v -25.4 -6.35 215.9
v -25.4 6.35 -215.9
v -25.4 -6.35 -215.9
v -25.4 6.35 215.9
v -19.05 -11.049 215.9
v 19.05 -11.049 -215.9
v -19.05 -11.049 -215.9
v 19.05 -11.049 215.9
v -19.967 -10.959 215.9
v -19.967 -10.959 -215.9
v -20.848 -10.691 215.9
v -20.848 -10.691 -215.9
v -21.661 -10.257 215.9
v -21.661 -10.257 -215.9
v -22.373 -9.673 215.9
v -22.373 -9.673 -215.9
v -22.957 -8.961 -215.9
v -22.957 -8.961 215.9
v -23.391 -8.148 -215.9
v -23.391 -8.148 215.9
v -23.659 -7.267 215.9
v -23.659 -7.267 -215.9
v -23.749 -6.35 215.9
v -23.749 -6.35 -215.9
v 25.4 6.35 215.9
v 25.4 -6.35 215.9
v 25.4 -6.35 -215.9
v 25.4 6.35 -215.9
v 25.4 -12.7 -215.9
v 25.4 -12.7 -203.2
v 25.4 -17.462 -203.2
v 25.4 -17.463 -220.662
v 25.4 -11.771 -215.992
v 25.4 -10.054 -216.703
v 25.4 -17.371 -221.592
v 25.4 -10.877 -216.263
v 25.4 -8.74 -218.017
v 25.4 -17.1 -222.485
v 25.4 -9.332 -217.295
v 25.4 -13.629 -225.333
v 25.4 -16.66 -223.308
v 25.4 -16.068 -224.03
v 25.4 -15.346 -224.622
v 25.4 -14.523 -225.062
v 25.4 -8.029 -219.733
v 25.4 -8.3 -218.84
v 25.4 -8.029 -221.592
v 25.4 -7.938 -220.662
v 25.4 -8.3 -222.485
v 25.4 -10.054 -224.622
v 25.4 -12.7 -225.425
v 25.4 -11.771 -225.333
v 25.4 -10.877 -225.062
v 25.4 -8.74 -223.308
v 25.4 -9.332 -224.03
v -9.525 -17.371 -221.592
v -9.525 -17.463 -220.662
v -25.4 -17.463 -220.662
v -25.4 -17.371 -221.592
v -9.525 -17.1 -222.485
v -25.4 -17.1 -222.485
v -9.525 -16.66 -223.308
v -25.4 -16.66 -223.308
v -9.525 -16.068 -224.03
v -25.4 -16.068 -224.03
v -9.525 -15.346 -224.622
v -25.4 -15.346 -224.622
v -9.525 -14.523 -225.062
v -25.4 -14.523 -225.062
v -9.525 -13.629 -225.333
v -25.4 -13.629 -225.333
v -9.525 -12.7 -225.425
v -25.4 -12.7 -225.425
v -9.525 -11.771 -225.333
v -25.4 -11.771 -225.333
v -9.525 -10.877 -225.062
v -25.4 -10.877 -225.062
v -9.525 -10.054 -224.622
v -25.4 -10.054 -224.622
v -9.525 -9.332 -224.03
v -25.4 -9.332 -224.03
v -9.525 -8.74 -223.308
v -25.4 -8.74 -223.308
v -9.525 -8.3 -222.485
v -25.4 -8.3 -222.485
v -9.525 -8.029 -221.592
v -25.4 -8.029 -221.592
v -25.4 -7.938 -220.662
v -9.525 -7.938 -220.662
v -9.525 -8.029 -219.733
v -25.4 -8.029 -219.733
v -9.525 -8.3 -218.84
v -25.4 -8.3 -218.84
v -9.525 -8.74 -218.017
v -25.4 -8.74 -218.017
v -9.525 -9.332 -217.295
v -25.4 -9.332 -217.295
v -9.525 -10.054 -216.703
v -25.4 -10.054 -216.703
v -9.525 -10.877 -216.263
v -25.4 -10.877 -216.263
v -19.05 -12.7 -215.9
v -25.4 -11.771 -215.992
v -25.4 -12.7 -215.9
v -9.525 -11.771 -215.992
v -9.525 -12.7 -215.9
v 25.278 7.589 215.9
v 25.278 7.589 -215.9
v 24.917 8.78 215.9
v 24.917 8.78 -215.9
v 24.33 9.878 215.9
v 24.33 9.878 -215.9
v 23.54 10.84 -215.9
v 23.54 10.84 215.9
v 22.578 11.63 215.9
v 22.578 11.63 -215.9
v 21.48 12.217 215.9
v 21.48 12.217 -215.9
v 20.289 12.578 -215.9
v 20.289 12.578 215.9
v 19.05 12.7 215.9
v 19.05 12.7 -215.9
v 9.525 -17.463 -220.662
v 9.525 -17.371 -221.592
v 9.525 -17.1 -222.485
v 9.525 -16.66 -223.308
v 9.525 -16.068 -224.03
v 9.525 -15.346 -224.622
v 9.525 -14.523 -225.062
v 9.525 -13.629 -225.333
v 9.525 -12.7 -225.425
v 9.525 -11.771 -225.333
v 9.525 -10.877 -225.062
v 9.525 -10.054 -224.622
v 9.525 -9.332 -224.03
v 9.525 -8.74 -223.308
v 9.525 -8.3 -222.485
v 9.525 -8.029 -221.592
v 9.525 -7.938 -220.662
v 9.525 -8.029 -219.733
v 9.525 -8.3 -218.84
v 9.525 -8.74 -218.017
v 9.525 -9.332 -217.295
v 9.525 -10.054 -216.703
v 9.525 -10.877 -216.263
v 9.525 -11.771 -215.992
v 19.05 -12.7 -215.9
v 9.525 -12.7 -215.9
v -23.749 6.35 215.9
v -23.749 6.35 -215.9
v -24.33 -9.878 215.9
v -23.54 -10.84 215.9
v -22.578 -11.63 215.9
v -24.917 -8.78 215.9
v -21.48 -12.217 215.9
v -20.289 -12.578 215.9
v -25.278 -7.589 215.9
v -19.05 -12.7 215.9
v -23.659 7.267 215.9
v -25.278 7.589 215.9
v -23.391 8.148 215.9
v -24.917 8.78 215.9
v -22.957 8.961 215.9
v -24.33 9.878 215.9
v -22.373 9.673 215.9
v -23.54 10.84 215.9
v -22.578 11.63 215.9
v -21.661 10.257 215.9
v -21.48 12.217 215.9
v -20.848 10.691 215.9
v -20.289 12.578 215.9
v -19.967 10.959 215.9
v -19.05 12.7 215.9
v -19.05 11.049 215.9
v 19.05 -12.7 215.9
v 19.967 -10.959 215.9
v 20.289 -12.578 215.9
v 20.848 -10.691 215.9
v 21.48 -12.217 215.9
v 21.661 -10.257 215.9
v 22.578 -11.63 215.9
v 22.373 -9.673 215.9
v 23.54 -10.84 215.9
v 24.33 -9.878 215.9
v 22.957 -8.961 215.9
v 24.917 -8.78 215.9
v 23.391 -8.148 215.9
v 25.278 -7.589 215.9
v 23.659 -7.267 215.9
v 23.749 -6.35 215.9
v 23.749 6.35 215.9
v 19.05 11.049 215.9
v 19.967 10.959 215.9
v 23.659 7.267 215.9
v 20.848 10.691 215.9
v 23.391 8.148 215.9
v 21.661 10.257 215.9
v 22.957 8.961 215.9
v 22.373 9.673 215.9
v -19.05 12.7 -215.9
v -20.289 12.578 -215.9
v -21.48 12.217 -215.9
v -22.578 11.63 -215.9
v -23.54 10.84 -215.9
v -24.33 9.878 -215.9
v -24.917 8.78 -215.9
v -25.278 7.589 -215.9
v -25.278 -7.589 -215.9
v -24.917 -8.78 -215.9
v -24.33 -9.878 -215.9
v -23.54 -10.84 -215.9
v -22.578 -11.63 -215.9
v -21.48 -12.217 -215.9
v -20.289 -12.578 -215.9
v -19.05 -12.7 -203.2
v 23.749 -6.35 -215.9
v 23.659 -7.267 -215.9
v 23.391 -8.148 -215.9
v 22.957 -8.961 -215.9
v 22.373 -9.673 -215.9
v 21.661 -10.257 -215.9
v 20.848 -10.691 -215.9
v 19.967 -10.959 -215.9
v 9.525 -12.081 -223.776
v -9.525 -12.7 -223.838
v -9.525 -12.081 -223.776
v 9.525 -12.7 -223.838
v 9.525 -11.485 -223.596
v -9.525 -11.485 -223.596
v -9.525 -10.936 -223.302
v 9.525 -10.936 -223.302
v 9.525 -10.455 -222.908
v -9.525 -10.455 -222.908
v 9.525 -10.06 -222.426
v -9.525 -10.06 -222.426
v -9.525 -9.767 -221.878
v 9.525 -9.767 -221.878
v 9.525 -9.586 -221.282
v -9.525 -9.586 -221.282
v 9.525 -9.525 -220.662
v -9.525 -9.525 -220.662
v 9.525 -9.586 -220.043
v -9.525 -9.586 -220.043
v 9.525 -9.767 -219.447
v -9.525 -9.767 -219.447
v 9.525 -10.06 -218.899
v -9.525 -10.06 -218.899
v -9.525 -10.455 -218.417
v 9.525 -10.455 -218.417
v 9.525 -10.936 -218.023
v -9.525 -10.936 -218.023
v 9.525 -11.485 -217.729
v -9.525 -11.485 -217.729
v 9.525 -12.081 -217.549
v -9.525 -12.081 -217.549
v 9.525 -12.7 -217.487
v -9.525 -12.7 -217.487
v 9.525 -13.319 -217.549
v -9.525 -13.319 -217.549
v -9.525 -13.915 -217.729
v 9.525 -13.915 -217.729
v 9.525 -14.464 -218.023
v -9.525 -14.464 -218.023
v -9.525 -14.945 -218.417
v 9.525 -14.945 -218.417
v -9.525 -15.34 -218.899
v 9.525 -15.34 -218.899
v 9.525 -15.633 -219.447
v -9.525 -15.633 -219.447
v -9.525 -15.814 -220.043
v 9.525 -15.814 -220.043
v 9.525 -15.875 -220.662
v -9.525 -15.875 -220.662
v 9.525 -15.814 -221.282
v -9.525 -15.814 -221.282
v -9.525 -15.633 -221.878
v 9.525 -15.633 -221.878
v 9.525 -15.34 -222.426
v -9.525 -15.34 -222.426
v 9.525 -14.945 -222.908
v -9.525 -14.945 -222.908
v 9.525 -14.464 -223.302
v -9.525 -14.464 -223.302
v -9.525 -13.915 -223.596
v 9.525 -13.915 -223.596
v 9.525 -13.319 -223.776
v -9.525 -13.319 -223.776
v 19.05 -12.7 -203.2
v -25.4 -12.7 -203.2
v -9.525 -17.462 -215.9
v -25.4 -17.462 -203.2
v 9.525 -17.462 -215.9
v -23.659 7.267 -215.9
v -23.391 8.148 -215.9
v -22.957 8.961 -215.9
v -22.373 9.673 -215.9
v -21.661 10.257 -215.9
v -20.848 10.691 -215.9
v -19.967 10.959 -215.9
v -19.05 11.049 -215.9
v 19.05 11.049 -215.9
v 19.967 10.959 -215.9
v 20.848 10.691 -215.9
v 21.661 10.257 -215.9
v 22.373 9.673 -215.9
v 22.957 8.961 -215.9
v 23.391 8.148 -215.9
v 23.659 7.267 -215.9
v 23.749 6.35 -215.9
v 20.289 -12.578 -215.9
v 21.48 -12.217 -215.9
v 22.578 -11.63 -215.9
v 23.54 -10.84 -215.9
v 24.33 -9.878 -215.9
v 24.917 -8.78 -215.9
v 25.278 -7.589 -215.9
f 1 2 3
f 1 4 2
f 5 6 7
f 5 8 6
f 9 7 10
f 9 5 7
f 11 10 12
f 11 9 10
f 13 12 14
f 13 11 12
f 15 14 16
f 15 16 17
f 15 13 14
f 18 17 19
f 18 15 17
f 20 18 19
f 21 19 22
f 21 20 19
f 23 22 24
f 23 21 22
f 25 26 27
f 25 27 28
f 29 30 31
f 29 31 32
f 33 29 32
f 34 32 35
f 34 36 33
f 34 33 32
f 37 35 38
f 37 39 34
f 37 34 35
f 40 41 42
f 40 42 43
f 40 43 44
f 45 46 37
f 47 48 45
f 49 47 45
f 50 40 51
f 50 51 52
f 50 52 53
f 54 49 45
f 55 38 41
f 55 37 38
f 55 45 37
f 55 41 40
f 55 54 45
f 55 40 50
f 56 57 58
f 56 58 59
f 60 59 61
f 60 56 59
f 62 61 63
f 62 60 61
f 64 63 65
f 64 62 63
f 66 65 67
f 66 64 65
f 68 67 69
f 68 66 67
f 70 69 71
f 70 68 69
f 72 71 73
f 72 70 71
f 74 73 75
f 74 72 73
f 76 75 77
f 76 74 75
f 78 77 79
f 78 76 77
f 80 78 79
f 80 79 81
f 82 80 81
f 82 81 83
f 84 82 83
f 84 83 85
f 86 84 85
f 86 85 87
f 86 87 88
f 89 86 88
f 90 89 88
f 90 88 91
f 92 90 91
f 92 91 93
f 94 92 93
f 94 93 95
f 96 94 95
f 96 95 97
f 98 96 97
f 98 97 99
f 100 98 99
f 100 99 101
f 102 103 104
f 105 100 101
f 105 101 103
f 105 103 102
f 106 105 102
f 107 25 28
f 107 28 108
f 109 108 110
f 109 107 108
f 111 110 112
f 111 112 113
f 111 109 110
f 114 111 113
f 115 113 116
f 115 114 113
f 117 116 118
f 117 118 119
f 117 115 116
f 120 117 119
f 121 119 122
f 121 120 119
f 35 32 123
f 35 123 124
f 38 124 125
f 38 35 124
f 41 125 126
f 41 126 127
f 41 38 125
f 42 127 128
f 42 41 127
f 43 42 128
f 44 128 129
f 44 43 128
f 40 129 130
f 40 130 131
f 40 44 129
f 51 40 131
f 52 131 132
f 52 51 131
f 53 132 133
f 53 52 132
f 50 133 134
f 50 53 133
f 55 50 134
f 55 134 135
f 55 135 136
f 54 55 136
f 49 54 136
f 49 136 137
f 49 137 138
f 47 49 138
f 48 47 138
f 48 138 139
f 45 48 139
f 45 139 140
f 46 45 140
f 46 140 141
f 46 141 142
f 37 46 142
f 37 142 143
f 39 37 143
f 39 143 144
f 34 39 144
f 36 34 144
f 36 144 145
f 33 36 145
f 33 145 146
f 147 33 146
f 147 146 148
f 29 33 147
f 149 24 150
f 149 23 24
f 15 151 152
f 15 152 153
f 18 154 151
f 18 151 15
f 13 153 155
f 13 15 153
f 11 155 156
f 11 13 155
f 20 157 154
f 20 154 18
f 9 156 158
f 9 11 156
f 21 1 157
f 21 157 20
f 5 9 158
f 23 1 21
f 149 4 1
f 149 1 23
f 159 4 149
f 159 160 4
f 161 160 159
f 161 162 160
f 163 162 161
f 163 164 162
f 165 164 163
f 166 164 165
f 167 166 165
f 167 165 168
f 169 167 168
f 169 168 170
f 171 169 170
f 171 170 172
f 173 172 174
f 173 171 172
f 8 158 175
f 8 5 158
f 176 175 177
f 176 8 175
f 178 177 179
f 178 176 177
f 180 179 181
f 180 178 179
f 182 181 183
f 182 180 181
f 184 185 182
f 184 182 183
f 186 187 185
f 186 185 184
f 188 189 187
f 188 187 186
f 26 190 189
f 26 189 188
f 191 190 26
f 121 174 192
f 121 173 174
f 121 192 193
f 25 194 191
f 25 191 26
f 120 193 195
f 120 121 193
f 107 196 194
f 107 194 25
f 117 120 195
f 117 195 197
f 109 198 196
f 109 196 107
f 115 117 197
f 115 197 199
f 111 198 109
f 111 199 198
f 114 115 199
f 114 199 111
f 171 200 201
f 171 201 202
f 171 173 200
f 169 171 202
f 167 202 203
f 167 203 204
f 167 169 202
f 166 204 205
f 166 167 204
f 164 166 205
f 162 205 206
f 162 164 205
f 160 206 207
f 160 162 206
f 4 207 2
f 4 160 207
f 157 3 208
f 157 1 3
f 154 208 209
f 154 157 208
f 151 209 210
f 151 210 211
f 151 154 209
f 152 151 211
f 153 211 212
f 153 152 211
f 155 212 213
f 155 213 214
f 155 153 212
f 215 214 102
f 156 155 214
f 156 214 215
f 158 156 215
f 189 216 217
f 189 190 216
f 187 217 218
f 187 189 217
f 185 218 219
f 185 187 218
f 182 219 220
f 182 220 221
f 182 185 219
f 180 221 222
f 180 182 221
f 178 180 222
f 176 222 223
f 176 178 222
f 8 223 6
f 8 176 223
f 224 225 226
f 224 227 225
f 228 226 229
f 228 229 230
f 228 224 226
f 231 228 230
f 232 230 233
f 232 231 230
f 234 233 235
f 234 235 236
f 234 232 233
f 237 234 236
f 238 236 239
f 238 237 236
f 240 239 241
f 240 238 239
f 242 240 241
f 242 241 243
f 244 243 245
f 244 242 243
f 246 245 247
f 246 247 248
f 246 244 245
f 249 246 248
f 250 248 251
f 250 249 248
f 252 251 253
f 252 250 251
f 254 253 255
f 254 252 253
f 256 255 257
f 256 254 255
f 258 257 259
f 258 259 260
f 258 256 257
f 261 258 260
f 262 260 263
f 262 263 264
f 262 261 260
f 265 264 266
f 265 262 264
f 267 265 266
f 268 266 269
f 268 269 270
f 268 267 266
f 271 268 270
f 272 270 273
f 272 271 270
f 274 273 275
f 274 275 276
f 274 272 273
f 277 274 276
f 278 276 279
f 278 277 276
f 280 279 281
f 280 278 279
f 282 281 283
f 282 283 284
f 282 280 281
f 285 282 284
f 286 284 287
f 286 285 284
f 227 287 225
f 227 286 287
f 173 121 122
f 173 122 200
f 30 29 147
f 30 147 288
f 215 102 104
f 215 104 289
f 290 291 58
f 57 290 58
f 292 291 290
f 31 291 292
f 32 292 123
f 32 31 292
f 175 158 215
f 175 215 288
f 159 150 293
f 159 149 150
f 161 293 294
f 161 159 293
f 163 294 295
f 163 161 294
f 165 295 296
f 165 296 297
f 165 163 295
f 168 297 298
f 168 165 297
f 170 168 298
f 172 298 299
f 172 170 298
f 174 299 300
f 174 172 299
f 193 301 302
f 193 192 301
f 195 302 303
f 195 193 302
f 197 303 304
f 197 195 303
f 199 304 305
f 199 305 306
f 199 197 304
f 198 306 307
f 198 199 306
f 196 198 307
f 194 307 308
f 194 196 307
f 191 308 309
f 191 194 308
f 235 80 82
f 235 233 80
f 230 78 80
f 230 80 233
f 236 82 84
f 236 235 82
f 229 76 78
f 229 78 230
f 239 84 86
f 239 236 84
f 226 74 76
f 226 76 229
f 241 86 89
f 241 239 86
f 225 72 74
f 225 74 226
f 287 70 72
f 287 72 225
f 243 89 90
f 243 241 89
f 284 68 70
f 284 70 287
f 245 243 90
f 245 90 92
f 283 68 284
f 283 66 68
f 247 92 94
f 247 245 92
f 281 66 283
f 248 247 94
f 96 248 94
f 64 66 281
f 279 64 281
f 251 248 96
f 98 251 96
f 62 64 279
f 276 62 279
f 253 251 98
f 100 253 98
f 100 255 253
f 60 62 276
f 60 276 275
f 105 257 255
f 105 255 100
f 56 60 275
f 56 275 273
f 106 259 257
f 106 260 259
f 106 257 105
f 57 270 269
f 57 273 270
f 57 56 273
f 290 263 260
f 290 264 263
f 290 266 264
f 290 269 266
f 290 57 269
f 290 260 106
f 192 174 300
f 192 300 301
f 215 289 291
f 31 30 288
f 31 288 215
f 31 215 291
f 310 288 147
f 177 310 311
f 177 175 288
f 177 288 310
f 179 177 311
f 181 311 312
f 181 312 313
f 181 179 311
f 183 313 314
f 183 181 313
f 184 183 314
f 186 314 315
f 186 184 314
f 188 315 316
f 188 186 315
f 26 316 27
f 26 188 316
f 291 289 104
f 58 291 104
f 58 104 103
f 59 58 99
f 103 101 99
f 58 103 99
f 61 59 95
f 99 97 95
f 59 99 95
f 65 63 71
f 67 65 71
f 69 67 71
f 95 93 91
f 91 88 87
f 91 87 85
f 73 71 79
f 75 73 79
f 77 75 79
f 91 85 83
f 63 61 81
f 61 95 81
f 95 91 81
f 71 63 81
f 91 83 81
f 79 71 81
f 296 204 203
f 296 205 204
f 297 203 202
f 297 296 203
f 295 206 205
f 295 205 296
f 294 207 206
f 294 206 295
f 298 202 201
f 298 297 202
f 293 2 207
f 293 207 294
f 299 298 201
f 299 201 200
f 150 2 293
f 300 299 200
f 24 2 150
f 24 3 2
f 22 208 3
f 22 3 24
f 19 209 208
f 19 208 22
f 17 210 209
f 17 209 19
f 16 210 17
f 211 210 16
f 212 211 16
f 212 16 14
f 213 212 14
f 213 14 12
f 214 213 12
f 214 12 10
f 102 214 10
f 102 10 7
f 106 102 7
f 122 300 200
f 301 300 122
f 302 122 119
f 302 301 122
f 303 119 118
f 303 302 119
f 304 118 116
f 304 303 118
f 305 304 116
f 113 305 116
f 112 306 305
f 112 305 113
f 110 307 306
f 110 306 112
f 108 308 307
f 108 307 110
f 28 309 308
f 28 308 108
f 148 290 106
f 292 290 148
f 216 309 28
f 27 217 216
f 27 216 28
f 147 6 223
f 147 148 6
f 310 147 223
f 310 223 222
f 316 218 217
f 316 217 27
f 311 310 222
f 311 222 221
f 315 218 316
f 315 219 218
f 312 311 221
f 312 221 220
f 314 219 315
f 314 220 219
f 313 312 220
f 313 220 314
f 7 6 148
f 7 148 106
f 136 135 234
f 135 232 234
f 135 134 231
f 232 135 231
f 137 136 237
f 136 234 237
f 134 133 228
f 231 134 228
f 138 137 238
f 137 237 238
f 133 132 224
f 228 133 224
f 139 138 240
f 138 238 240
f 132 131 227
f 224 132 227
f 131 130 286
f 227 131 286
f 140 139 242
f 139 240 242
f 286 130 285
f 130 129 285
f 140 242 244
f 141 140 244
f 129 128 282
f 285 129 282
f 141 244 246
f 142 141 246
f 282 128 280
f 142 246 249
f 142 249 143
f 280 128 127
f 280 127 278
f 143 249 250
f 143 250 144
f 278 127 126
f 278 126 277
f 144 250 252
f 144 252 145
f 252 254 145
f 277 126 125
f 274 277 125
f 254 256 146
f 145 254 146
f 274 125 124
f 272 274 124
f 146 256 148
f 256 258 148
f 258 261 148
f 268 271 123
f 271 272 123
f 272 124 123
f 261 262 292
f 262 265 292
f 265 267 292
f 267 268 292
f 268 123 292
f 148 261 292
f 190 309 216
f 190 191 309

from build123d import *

# Parameters (mm, degrees)
BOSS_EXTRUDE1_DEPTH = 215.9
BOSS_EXTRUDE2_DEPTH = 50.8
SKETCH4_W           = 19.05
SKETCH4_H           = 9.525
CUT_EXTRUDE1_DEPTH  = 31.1625
SKETCH3_R           = 3.175
BOSS_EXTRUDE3_DEPTH = 19.05


with BuildPart() as part:
    # Sketch1 → Boss-Extrude1 (new body, symmetric)
    with BuildSketch(Plane.XY):
        with BuildLine():
            Line((-19.05, -12.7), (19.05, -12.7))
            ThreePointArc((19.05, -12.7), (23.540128061, -10.840128061), (25.4, -6.35))
            Line((25.4, -6.35), (25.4, 6.35))
            ThreePointArc((25.4, 6.35), (23.540128061, 10.840128061), (19.05, 12.7))
            Line((19.05, 12.7), (-19.05, 12.7))
            ThreePointArc((-19.05, 12.7), (-23.540128061, 10.840128061), (-25.4, 6.35))
            Line((-25.4, 6.35), (-25.4, -6.35))
            ThreePointArc((-25.4, -6.35), (-23.540128061, -10.840128061), (-19.05, -12.7))
        make_face()
        with BuildLine():
            Line((-19.05, 11.049), (19.05, 11.049))
            ThreePointArc((19.05, 11.049), (22.372694765, 9.672694765), (23.749, 6.35))
            Line((23.749, 6.35), (23.749, -6.35))
            ThreePointArc((23.749, -6.35), (22.372694765, -9.672694765), (19.05, -11.049))
            Line((19.05, -11.049), (-19.05, -11.049))
            ThreePointArc((-19.05, -11.049), (-22.372694765, -9.672694765), (-23.749, -6.35))
            Line((-23.749, -6.35), (-23.749, 6.35))
            ThreePointArc((-23.749, 6.35), (-22.372694765, 9.672694765), (-19.05, 11.049))
        make_face(mode=Mode.SUBTRACT)
    extrude(amount=BOSS_EXTRUDE1_DEPTH, both=True)

    # Sketch2 → Boss-Extrude2 (add, through all)
    with BuildSketch(Plane(origin=(25.4, 0, 0), x_dir=(0, 0, -1), z_dir=(1, 0, 0))):
        with BuildLine():
            Line((203.2, -12.7), (203.2, -17.4625))
            Line((203.2, -17.4625), (220.6625, -17.4625))
            ThreePointArc((220.6625, -17.4625), (224.030096045, -9.332403955), (215.9, -12.7))
            Line((215.9, -12.7), (203.2, -12.7))
        make_face()
    extrude(amount=-BOSS_EXTRUDE2_DEPTH)

    # Sketch4 → Cut-Extrude1 (cut, through all)
    with BuildSketch(Plane.XZ.offset(17.4625)):
        with Locations((0, -220.6625)):
            Rectangle(SKETCH4_W, SKETCH4_H)
    extrude(amount=-CUT_EXTRUDE1_DEPTH, mode=Mode.SUBTRACT)

    # Sketch3 → Boss-Extrude3 (add, symmetric)
    with BuildSketch(Plane(origin=(0, 0, 0), x_dir=(0, 0, -1), z_dir=(1, 0, 0))):
        with Locations((220.6625, -12.7)):
            Circle(SKETCH3_R)
    extrude(amount=BOSS_EXTRUDE3_DEPTH, both=True)


solid = part.part
